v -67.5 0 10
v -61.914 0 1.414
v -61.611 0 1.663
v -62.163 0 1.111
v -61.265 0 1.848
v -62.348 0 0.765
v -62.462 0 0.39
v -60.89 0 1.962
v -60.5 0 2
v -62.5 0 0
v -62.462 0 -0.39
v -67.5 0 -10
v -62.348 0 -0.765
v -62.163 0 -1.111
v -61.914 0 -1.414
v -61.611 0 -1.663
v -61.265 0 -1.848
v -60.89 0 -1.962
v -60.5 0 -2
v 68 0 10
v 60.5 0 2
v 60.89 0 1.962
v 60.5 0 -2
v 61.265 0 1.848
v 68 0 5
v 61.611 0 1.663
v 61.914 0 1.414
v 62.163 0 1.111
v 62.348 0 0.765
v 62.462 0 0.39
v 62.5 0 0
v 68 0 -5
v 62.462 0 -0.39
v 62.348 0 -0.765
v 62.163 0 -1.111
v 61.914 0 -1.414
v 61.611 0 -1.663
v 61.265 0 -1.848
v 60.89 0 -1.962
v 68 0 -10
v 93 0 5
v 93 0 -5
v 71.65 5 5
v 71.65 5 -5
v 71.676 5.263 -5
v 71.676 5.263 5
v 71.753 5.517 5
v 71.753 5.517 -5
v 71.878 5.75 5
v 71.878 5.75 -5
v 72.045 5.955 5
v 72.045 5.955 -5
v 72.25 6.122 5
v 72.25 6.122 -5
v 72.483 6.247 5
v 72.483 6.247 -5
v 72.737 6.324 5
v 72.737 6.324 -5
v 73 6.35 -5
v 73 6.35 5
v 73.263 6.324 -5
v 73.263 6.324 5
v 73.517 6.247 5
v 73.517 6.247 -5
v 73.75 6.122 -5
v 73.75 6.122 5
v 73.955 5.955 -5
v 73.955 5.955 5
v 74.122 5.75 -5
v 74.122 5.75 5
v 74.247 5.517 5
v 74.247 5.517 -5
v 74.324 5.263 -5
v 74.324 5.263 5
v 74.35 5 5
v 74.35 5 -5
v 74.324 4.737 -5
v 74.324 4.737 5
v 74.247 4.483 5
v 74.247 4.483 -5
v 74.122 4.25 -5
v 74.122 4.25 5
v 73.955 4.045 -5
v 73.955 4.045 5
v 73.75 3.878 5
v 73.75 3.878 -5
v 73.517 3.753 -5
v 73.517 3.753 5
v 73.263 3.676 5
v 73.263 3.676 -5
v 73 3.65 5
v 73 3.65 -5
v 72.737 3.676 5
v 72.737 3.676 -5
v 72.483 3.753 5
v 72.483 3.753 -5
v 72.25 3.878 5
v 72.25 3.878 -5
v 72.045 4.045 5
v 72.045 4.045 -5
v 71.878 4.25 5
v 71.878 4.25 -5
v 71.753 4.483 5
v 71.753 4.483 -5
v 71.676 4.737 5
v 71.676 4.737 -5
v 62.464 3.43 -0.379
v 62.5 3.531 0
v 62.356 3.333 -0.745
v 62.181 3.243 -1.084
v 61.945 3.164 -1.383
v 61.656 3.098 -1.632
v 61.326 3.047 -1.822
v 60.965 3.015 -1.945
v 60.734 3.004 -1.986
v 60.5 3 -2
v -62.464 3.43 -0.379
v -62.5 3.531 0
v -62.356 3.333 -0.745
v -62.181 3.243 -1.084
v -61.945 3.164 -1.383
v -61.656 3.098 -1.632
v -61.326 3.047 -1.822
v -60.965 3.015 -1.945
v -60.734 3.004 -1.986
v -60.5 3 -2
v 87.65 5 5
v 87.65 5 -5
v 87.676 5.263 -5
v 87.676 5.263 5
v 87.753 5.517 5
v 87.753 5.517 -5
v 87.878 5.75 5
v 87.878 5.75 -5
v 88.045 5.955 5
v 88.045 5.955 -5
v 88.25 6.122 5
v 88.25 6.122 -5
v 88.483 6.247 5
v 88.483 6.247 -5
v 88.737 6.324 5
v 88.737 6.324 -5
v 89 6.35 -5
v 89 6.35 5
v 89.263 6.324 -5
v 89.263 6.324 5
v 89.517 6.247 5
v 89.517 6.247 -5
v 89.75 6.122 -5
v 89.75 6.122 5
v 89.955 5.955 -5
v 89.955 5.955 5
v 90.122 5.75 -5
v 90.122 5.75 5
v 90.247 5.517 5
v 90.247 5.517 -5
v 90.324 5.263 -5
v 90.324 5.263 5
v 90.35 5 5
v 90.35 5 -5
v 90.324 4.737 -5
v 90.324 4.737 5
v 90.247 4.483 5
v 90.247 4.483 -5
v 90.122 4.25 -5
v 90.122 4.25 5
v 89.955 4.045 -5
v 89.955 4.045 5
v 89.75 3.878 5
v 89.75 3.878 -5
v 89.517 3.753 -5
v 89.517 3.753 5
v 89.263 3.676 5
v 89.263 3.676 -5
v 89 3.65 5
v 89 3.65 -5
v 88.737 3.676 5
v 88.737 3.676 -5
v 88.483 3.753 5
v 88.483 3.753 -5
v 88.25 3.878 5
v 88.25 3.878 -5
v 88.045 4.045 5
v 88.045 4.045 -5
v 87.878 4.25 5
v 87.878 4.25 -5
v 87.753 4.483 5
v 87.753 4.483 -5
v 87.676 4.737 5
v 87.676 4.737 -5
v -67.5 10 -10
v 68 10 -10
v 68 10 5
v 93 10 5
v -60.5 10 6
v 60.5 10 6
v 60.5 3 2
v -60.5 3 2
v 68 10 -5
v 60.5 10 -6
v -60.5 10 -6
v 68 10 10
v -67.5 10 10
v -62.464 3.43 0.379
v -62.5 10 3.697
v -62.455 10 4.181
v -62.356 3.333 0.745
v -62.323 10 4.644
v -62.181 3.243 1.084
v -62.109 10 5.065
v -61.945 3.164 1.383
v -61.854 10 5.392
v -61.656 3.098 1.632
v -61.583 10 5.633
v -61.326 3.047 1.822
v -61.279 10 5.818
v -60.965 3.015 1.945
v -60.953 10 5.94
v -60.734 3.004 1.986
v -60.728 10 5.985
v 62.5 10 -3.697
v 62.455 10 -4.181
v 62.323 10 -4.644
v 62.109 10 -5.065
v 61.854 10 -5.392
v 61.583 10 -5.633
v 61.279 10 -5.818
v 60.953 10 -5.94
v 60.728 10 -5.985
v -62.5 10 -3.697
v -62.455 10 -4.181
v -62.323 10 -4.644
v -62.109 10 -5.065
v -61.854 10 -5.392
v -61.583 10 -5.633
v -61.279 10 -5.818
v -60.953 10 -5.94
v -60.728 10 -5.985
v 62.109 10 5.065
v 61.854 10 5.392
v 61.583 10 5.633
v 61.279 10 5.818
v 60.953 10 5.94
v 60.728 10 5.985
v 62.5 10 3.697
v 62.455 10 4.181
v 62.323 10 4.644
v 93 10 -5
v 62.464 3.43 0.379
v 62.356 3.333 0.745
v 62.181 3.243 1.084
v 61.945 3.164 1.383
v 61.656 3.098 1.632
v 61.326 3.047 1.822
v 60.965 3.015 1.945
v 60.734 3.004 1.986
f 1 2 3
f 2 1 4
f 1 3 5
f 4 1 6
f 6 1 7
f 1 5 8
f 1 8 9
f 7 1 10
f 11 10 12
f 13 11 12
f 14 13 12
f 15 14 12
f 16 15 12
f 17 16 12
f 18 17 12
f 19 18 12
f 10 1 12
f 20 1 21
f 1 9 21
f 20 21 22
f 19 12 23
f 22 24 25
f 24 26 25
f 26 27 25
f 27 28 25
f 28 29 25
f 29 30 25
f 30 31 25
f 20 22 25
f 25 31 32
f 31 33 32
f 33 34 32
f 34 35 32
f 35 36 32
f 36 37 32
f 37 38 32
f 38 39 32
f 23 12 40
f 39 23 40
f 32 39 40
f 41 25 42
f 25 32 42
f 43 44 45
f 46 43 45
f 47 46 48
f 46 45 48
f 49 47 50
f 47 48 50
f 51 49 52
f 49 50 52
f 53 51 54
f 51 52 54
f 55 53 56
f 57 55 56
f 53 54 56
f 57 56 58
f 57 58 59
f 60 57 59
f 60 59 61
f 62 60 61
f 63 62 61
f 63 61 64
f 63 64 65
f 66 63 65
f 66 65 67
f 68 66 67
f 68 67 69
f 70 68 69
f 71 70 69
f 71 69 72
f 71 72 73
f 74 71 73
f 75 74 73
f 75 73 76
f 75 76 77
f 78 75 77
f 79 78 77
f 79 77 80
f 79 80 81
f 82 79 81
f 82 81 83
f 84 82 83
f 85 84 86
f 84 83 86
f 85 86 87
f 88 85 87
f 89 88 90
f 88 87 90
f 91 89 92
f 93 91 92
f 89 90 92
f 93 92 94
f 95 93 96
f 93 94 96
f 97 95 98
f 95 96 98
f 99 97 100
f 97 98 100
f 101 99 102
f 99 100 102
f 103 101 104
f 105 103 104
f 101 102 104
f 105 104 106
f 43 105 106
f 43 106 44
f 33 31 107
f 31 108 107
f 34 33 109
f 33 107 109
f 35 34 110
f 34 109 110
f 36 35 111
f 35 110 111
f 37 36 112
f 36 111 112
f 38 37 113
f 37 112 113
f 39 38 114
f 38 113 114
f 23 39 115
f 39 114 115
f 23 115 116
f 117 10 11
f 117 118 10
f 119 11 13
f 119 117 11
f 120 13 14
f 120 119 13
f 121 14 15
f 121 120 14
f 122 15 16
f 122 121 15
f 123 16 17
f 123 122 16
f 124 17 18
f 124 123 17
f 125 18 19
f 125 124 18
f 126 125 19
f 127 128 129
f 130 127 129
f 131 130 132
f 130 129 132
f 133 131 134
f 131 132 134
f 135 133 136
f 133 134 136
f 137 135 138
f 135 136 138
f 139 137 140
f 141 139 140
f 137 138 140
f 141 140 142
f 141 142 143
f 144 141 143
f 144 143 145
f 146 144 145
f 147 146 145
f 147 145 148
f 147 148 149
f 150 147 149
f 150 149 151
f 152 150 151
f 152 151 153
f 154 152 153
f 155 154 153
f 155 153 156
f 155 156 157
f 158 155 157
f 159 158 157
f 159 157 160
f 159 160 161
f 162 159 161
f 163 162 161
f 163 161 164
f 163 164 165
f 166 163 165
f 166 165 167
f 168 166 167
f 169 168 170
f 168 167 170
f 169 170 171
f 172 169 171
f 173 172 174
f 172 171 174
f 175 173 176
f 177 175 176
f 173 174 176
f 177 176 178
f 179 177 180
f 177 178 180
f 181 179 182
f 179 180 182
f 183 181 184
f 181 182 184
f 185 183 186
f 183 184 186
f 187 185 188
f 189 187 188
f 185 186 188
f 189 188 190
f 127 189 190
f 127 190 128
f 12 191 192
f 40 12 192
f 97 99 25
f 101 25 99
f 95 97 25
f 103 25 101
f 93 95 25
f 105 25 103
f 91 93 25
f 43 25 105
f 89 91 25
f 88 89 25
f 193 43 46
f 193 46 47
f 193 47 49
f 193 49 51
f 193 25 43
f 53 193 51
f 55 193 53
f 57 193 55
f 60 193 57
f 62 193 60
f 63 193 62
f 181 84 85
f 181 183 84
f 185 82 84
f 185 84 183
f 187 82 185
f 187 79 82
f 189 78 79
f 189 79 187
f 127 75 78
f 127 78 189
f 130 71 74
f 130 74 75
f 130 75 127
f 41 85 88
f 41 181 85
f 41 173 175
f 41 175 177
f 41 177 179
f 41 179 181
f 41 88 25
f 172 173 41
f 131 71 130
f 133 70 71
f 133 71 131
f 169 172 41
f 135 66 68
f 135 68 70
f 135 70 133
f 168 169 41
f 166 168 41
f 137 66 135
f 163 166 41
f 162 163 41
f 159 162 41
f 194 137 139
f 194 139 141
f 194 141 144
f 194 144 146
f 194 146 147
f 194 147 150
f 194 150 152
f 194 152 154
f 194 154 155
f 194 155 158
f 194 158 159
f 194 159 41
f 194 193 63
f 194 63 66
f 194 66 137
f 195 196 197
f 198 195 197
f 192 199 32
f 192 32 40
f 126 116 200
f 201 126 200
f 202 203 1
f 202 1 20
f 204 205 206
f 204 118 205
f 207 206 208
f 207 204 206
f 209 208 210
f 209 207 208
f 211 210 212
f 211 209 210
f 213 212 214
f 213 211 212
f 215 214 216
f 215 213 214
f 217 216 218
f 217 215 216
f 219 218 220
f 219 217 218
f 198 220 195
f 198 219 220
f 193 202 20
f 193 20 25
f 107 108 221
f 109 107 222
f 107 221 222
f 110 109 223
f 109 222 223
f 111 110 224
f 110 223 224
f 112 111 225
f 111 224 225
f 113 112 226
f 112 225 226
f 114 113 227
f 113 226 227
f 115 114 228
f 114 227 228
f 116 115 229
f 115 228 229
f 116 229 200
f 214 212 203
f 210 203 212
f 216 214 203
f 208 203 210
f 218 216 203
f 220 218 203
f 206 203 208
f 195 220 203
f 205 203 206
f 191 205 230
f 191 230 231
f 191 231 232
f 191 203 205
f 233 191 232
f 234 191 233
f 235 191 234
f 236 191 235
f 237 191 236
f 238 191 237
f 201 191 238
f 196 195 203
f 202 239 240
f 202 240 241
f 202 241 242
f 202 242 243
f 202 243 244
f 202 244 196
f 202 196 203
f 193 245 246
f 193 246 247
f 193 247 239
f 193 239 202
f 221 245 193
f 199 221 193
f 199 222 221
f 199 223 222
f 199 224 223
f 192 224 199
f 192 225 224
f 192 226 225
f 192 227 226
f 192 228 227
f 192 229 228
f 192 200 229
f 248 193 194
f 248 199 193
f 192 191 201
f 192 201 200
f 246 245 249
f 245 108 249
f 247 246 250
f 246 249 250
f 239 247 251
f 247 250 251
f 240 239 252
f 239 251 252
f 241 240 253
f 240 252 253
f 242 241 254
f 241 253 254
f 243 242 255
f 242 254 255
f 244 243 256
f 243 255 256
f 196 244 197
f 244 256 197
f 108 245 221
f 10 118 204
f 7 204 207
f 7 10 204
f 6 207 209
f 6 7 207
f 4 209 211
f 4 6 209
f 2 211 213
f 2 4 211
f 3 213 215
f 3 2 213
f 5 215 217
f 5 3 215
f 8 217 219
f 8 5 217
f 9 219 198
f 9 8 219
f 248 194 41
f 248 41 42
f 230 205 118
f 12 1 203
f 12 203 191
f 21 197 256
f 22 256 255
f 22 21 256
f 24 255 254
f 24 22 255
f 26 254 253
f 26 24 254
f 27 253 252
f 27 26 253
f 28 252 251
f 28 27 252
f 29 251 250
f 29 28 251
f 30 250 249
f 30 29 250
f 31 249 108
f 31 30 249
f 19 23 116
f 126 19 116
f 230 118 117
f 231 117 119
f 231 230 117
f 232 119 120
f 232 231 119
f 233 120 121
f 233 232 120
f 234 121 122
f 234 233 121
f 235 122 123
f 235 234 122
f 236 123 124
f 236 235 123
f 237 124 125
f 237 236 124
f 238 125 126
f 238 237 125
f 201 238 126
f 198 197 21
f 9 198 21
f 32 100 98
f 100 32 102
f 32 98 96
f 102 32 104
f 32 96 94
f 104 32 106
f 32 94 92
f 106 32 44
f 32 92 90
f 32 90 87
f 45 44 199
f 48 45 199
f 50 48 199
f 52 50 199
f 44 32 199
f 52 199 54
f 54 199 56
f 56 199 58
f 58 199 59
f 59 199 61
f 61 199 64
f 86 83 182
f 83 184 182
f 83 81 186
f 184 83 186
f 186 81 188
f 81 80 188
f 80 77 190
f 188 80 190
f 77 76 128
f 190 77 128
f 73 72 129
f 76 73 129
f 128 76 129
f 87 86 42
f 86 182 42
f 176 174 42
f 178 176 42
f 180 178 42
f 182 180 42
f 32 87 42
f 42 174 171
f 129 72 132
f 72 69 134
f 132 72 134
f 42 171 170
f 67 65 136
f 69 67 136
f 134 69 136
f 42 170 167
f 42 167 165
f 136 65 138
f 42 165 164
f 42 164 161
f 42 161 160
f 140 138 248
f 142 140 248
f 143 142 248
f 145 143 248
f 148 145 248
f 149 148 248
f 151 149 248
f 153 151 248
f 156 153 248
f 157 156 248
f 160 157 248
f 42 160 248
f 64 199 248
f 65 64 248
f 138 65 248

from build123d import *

# Parameters (mm, degrees)
SKETCH_1_W          = 135
SKETCH_1_H          = 20
EXTRUDE_3_DEPTH     = 10
CUT_EXTRUDE_1_DEPTH = 62.5
FILLET_1_R          = 2
SKETCH_4_W          = 25.5
SKETCH_4_H          = 20
EXTRUDE_5_DEPTH     = 10
SKETCH_5_R          = 1.35
CUT_EXTRUDE_2_DEPTH = 96.650405122
SKETCH_6_W          = 25
SKETCH_6_H          = 5
CUT_EXTRUDE_3_DEPTH = 95.069123521


with BuildPart() as part:
    # 草图1 → 凸台-拉伸3 (new body)
    with BuildSketch(Plane(origin=(0, 0, 0), x_dir=(1, 0, 0), z_dir=(0, 1, 0))):
        Rectangle(SKETCH_1_W, SKETCH_1_H)
    extrude(amount=EXTRUDE_3_DEPTH)

    # 草图2 → 切除-拉伸1 (cut, symmetric)
    with BuildSketch(Plane(origin=(0, 0, 0), x_dir=(0, 0, -1), z_dir=(1, 0, 0))):
        Polygon((-6, 10), (-2, 3), (-2, 0), (2, 0), (2, 3), (6, 10), align=None)
    extrude(amount=CUT_EXTRUDE_1_DEPTH, both=True, mode=Mode.SUBTRACT)

    # 圆角1
    fillet_1_edges = [part.edges().sort_by_distance(p)[0] for p in [
        (62.5, 6.5, 4),
        (62.5, 6.5, -4),
        (-62.5, 6.5, -4),
        (-62.5, 6.5, 4),
        (-62.5, 1.5, -2),
        (62.5, 1.5, -2),
        (62.5, 1.5, 2),
        (-62.5, 1.5, 2),
    ]]
    fillet(fillet_1_edges, radius=FILLET_1_R - 0.0001)  # a hair under: the kernel refuses the full size

    # 草图4 → 凸台-拉伸5 (add)
    with BuildSketch(Plane(origin=(0, 10, 0), x_dir=(1, 0, 0), z_dir=(0, 1, 0))):
        with Locations((80.25, 0)):
            Rectangle(SKETCH_4_W, SKETCH_4_H)
    extrude(amount=-EXTRUDE_5_DEPTH)

    # 草图5 → 切除-拉伸2 (cut, through all)
    with BuildSketch(Plane(origin=(0, 0, -10), x_dir=(-1, 0, 0), z_dir=(0, 0, -1))):
        with Locations((-89, 5)):
            Circle(SKETCH_5_R)
        with Locations((-73, 5)):
            Circle(SKETCH_5_R)
    extrude(amount=-CUT_EXTRUDE_2_DEPTH, mode=Mode.SUBTRACT)

    # 草图6 → 切除-拉伸3 (cut, through all)
    with BuildSketch(Plane(origin=(0, 10, 0), x_dir=(1, 0, 0), z_dir=(0, 1, 0))):
        with Locations((80.5, -7.5)):
            Rectangle(SKETCH_6_W, SKETCH_6_H)
        with Locations((80.5, 7.5)):
            Rectangle(SKETCH_6_W, SKETCH_6_H)
    extrude(amount=-CUT_EXTRUDE_3_DEPTH, mode=Mode.SUBTRACT)


solid = part.part
